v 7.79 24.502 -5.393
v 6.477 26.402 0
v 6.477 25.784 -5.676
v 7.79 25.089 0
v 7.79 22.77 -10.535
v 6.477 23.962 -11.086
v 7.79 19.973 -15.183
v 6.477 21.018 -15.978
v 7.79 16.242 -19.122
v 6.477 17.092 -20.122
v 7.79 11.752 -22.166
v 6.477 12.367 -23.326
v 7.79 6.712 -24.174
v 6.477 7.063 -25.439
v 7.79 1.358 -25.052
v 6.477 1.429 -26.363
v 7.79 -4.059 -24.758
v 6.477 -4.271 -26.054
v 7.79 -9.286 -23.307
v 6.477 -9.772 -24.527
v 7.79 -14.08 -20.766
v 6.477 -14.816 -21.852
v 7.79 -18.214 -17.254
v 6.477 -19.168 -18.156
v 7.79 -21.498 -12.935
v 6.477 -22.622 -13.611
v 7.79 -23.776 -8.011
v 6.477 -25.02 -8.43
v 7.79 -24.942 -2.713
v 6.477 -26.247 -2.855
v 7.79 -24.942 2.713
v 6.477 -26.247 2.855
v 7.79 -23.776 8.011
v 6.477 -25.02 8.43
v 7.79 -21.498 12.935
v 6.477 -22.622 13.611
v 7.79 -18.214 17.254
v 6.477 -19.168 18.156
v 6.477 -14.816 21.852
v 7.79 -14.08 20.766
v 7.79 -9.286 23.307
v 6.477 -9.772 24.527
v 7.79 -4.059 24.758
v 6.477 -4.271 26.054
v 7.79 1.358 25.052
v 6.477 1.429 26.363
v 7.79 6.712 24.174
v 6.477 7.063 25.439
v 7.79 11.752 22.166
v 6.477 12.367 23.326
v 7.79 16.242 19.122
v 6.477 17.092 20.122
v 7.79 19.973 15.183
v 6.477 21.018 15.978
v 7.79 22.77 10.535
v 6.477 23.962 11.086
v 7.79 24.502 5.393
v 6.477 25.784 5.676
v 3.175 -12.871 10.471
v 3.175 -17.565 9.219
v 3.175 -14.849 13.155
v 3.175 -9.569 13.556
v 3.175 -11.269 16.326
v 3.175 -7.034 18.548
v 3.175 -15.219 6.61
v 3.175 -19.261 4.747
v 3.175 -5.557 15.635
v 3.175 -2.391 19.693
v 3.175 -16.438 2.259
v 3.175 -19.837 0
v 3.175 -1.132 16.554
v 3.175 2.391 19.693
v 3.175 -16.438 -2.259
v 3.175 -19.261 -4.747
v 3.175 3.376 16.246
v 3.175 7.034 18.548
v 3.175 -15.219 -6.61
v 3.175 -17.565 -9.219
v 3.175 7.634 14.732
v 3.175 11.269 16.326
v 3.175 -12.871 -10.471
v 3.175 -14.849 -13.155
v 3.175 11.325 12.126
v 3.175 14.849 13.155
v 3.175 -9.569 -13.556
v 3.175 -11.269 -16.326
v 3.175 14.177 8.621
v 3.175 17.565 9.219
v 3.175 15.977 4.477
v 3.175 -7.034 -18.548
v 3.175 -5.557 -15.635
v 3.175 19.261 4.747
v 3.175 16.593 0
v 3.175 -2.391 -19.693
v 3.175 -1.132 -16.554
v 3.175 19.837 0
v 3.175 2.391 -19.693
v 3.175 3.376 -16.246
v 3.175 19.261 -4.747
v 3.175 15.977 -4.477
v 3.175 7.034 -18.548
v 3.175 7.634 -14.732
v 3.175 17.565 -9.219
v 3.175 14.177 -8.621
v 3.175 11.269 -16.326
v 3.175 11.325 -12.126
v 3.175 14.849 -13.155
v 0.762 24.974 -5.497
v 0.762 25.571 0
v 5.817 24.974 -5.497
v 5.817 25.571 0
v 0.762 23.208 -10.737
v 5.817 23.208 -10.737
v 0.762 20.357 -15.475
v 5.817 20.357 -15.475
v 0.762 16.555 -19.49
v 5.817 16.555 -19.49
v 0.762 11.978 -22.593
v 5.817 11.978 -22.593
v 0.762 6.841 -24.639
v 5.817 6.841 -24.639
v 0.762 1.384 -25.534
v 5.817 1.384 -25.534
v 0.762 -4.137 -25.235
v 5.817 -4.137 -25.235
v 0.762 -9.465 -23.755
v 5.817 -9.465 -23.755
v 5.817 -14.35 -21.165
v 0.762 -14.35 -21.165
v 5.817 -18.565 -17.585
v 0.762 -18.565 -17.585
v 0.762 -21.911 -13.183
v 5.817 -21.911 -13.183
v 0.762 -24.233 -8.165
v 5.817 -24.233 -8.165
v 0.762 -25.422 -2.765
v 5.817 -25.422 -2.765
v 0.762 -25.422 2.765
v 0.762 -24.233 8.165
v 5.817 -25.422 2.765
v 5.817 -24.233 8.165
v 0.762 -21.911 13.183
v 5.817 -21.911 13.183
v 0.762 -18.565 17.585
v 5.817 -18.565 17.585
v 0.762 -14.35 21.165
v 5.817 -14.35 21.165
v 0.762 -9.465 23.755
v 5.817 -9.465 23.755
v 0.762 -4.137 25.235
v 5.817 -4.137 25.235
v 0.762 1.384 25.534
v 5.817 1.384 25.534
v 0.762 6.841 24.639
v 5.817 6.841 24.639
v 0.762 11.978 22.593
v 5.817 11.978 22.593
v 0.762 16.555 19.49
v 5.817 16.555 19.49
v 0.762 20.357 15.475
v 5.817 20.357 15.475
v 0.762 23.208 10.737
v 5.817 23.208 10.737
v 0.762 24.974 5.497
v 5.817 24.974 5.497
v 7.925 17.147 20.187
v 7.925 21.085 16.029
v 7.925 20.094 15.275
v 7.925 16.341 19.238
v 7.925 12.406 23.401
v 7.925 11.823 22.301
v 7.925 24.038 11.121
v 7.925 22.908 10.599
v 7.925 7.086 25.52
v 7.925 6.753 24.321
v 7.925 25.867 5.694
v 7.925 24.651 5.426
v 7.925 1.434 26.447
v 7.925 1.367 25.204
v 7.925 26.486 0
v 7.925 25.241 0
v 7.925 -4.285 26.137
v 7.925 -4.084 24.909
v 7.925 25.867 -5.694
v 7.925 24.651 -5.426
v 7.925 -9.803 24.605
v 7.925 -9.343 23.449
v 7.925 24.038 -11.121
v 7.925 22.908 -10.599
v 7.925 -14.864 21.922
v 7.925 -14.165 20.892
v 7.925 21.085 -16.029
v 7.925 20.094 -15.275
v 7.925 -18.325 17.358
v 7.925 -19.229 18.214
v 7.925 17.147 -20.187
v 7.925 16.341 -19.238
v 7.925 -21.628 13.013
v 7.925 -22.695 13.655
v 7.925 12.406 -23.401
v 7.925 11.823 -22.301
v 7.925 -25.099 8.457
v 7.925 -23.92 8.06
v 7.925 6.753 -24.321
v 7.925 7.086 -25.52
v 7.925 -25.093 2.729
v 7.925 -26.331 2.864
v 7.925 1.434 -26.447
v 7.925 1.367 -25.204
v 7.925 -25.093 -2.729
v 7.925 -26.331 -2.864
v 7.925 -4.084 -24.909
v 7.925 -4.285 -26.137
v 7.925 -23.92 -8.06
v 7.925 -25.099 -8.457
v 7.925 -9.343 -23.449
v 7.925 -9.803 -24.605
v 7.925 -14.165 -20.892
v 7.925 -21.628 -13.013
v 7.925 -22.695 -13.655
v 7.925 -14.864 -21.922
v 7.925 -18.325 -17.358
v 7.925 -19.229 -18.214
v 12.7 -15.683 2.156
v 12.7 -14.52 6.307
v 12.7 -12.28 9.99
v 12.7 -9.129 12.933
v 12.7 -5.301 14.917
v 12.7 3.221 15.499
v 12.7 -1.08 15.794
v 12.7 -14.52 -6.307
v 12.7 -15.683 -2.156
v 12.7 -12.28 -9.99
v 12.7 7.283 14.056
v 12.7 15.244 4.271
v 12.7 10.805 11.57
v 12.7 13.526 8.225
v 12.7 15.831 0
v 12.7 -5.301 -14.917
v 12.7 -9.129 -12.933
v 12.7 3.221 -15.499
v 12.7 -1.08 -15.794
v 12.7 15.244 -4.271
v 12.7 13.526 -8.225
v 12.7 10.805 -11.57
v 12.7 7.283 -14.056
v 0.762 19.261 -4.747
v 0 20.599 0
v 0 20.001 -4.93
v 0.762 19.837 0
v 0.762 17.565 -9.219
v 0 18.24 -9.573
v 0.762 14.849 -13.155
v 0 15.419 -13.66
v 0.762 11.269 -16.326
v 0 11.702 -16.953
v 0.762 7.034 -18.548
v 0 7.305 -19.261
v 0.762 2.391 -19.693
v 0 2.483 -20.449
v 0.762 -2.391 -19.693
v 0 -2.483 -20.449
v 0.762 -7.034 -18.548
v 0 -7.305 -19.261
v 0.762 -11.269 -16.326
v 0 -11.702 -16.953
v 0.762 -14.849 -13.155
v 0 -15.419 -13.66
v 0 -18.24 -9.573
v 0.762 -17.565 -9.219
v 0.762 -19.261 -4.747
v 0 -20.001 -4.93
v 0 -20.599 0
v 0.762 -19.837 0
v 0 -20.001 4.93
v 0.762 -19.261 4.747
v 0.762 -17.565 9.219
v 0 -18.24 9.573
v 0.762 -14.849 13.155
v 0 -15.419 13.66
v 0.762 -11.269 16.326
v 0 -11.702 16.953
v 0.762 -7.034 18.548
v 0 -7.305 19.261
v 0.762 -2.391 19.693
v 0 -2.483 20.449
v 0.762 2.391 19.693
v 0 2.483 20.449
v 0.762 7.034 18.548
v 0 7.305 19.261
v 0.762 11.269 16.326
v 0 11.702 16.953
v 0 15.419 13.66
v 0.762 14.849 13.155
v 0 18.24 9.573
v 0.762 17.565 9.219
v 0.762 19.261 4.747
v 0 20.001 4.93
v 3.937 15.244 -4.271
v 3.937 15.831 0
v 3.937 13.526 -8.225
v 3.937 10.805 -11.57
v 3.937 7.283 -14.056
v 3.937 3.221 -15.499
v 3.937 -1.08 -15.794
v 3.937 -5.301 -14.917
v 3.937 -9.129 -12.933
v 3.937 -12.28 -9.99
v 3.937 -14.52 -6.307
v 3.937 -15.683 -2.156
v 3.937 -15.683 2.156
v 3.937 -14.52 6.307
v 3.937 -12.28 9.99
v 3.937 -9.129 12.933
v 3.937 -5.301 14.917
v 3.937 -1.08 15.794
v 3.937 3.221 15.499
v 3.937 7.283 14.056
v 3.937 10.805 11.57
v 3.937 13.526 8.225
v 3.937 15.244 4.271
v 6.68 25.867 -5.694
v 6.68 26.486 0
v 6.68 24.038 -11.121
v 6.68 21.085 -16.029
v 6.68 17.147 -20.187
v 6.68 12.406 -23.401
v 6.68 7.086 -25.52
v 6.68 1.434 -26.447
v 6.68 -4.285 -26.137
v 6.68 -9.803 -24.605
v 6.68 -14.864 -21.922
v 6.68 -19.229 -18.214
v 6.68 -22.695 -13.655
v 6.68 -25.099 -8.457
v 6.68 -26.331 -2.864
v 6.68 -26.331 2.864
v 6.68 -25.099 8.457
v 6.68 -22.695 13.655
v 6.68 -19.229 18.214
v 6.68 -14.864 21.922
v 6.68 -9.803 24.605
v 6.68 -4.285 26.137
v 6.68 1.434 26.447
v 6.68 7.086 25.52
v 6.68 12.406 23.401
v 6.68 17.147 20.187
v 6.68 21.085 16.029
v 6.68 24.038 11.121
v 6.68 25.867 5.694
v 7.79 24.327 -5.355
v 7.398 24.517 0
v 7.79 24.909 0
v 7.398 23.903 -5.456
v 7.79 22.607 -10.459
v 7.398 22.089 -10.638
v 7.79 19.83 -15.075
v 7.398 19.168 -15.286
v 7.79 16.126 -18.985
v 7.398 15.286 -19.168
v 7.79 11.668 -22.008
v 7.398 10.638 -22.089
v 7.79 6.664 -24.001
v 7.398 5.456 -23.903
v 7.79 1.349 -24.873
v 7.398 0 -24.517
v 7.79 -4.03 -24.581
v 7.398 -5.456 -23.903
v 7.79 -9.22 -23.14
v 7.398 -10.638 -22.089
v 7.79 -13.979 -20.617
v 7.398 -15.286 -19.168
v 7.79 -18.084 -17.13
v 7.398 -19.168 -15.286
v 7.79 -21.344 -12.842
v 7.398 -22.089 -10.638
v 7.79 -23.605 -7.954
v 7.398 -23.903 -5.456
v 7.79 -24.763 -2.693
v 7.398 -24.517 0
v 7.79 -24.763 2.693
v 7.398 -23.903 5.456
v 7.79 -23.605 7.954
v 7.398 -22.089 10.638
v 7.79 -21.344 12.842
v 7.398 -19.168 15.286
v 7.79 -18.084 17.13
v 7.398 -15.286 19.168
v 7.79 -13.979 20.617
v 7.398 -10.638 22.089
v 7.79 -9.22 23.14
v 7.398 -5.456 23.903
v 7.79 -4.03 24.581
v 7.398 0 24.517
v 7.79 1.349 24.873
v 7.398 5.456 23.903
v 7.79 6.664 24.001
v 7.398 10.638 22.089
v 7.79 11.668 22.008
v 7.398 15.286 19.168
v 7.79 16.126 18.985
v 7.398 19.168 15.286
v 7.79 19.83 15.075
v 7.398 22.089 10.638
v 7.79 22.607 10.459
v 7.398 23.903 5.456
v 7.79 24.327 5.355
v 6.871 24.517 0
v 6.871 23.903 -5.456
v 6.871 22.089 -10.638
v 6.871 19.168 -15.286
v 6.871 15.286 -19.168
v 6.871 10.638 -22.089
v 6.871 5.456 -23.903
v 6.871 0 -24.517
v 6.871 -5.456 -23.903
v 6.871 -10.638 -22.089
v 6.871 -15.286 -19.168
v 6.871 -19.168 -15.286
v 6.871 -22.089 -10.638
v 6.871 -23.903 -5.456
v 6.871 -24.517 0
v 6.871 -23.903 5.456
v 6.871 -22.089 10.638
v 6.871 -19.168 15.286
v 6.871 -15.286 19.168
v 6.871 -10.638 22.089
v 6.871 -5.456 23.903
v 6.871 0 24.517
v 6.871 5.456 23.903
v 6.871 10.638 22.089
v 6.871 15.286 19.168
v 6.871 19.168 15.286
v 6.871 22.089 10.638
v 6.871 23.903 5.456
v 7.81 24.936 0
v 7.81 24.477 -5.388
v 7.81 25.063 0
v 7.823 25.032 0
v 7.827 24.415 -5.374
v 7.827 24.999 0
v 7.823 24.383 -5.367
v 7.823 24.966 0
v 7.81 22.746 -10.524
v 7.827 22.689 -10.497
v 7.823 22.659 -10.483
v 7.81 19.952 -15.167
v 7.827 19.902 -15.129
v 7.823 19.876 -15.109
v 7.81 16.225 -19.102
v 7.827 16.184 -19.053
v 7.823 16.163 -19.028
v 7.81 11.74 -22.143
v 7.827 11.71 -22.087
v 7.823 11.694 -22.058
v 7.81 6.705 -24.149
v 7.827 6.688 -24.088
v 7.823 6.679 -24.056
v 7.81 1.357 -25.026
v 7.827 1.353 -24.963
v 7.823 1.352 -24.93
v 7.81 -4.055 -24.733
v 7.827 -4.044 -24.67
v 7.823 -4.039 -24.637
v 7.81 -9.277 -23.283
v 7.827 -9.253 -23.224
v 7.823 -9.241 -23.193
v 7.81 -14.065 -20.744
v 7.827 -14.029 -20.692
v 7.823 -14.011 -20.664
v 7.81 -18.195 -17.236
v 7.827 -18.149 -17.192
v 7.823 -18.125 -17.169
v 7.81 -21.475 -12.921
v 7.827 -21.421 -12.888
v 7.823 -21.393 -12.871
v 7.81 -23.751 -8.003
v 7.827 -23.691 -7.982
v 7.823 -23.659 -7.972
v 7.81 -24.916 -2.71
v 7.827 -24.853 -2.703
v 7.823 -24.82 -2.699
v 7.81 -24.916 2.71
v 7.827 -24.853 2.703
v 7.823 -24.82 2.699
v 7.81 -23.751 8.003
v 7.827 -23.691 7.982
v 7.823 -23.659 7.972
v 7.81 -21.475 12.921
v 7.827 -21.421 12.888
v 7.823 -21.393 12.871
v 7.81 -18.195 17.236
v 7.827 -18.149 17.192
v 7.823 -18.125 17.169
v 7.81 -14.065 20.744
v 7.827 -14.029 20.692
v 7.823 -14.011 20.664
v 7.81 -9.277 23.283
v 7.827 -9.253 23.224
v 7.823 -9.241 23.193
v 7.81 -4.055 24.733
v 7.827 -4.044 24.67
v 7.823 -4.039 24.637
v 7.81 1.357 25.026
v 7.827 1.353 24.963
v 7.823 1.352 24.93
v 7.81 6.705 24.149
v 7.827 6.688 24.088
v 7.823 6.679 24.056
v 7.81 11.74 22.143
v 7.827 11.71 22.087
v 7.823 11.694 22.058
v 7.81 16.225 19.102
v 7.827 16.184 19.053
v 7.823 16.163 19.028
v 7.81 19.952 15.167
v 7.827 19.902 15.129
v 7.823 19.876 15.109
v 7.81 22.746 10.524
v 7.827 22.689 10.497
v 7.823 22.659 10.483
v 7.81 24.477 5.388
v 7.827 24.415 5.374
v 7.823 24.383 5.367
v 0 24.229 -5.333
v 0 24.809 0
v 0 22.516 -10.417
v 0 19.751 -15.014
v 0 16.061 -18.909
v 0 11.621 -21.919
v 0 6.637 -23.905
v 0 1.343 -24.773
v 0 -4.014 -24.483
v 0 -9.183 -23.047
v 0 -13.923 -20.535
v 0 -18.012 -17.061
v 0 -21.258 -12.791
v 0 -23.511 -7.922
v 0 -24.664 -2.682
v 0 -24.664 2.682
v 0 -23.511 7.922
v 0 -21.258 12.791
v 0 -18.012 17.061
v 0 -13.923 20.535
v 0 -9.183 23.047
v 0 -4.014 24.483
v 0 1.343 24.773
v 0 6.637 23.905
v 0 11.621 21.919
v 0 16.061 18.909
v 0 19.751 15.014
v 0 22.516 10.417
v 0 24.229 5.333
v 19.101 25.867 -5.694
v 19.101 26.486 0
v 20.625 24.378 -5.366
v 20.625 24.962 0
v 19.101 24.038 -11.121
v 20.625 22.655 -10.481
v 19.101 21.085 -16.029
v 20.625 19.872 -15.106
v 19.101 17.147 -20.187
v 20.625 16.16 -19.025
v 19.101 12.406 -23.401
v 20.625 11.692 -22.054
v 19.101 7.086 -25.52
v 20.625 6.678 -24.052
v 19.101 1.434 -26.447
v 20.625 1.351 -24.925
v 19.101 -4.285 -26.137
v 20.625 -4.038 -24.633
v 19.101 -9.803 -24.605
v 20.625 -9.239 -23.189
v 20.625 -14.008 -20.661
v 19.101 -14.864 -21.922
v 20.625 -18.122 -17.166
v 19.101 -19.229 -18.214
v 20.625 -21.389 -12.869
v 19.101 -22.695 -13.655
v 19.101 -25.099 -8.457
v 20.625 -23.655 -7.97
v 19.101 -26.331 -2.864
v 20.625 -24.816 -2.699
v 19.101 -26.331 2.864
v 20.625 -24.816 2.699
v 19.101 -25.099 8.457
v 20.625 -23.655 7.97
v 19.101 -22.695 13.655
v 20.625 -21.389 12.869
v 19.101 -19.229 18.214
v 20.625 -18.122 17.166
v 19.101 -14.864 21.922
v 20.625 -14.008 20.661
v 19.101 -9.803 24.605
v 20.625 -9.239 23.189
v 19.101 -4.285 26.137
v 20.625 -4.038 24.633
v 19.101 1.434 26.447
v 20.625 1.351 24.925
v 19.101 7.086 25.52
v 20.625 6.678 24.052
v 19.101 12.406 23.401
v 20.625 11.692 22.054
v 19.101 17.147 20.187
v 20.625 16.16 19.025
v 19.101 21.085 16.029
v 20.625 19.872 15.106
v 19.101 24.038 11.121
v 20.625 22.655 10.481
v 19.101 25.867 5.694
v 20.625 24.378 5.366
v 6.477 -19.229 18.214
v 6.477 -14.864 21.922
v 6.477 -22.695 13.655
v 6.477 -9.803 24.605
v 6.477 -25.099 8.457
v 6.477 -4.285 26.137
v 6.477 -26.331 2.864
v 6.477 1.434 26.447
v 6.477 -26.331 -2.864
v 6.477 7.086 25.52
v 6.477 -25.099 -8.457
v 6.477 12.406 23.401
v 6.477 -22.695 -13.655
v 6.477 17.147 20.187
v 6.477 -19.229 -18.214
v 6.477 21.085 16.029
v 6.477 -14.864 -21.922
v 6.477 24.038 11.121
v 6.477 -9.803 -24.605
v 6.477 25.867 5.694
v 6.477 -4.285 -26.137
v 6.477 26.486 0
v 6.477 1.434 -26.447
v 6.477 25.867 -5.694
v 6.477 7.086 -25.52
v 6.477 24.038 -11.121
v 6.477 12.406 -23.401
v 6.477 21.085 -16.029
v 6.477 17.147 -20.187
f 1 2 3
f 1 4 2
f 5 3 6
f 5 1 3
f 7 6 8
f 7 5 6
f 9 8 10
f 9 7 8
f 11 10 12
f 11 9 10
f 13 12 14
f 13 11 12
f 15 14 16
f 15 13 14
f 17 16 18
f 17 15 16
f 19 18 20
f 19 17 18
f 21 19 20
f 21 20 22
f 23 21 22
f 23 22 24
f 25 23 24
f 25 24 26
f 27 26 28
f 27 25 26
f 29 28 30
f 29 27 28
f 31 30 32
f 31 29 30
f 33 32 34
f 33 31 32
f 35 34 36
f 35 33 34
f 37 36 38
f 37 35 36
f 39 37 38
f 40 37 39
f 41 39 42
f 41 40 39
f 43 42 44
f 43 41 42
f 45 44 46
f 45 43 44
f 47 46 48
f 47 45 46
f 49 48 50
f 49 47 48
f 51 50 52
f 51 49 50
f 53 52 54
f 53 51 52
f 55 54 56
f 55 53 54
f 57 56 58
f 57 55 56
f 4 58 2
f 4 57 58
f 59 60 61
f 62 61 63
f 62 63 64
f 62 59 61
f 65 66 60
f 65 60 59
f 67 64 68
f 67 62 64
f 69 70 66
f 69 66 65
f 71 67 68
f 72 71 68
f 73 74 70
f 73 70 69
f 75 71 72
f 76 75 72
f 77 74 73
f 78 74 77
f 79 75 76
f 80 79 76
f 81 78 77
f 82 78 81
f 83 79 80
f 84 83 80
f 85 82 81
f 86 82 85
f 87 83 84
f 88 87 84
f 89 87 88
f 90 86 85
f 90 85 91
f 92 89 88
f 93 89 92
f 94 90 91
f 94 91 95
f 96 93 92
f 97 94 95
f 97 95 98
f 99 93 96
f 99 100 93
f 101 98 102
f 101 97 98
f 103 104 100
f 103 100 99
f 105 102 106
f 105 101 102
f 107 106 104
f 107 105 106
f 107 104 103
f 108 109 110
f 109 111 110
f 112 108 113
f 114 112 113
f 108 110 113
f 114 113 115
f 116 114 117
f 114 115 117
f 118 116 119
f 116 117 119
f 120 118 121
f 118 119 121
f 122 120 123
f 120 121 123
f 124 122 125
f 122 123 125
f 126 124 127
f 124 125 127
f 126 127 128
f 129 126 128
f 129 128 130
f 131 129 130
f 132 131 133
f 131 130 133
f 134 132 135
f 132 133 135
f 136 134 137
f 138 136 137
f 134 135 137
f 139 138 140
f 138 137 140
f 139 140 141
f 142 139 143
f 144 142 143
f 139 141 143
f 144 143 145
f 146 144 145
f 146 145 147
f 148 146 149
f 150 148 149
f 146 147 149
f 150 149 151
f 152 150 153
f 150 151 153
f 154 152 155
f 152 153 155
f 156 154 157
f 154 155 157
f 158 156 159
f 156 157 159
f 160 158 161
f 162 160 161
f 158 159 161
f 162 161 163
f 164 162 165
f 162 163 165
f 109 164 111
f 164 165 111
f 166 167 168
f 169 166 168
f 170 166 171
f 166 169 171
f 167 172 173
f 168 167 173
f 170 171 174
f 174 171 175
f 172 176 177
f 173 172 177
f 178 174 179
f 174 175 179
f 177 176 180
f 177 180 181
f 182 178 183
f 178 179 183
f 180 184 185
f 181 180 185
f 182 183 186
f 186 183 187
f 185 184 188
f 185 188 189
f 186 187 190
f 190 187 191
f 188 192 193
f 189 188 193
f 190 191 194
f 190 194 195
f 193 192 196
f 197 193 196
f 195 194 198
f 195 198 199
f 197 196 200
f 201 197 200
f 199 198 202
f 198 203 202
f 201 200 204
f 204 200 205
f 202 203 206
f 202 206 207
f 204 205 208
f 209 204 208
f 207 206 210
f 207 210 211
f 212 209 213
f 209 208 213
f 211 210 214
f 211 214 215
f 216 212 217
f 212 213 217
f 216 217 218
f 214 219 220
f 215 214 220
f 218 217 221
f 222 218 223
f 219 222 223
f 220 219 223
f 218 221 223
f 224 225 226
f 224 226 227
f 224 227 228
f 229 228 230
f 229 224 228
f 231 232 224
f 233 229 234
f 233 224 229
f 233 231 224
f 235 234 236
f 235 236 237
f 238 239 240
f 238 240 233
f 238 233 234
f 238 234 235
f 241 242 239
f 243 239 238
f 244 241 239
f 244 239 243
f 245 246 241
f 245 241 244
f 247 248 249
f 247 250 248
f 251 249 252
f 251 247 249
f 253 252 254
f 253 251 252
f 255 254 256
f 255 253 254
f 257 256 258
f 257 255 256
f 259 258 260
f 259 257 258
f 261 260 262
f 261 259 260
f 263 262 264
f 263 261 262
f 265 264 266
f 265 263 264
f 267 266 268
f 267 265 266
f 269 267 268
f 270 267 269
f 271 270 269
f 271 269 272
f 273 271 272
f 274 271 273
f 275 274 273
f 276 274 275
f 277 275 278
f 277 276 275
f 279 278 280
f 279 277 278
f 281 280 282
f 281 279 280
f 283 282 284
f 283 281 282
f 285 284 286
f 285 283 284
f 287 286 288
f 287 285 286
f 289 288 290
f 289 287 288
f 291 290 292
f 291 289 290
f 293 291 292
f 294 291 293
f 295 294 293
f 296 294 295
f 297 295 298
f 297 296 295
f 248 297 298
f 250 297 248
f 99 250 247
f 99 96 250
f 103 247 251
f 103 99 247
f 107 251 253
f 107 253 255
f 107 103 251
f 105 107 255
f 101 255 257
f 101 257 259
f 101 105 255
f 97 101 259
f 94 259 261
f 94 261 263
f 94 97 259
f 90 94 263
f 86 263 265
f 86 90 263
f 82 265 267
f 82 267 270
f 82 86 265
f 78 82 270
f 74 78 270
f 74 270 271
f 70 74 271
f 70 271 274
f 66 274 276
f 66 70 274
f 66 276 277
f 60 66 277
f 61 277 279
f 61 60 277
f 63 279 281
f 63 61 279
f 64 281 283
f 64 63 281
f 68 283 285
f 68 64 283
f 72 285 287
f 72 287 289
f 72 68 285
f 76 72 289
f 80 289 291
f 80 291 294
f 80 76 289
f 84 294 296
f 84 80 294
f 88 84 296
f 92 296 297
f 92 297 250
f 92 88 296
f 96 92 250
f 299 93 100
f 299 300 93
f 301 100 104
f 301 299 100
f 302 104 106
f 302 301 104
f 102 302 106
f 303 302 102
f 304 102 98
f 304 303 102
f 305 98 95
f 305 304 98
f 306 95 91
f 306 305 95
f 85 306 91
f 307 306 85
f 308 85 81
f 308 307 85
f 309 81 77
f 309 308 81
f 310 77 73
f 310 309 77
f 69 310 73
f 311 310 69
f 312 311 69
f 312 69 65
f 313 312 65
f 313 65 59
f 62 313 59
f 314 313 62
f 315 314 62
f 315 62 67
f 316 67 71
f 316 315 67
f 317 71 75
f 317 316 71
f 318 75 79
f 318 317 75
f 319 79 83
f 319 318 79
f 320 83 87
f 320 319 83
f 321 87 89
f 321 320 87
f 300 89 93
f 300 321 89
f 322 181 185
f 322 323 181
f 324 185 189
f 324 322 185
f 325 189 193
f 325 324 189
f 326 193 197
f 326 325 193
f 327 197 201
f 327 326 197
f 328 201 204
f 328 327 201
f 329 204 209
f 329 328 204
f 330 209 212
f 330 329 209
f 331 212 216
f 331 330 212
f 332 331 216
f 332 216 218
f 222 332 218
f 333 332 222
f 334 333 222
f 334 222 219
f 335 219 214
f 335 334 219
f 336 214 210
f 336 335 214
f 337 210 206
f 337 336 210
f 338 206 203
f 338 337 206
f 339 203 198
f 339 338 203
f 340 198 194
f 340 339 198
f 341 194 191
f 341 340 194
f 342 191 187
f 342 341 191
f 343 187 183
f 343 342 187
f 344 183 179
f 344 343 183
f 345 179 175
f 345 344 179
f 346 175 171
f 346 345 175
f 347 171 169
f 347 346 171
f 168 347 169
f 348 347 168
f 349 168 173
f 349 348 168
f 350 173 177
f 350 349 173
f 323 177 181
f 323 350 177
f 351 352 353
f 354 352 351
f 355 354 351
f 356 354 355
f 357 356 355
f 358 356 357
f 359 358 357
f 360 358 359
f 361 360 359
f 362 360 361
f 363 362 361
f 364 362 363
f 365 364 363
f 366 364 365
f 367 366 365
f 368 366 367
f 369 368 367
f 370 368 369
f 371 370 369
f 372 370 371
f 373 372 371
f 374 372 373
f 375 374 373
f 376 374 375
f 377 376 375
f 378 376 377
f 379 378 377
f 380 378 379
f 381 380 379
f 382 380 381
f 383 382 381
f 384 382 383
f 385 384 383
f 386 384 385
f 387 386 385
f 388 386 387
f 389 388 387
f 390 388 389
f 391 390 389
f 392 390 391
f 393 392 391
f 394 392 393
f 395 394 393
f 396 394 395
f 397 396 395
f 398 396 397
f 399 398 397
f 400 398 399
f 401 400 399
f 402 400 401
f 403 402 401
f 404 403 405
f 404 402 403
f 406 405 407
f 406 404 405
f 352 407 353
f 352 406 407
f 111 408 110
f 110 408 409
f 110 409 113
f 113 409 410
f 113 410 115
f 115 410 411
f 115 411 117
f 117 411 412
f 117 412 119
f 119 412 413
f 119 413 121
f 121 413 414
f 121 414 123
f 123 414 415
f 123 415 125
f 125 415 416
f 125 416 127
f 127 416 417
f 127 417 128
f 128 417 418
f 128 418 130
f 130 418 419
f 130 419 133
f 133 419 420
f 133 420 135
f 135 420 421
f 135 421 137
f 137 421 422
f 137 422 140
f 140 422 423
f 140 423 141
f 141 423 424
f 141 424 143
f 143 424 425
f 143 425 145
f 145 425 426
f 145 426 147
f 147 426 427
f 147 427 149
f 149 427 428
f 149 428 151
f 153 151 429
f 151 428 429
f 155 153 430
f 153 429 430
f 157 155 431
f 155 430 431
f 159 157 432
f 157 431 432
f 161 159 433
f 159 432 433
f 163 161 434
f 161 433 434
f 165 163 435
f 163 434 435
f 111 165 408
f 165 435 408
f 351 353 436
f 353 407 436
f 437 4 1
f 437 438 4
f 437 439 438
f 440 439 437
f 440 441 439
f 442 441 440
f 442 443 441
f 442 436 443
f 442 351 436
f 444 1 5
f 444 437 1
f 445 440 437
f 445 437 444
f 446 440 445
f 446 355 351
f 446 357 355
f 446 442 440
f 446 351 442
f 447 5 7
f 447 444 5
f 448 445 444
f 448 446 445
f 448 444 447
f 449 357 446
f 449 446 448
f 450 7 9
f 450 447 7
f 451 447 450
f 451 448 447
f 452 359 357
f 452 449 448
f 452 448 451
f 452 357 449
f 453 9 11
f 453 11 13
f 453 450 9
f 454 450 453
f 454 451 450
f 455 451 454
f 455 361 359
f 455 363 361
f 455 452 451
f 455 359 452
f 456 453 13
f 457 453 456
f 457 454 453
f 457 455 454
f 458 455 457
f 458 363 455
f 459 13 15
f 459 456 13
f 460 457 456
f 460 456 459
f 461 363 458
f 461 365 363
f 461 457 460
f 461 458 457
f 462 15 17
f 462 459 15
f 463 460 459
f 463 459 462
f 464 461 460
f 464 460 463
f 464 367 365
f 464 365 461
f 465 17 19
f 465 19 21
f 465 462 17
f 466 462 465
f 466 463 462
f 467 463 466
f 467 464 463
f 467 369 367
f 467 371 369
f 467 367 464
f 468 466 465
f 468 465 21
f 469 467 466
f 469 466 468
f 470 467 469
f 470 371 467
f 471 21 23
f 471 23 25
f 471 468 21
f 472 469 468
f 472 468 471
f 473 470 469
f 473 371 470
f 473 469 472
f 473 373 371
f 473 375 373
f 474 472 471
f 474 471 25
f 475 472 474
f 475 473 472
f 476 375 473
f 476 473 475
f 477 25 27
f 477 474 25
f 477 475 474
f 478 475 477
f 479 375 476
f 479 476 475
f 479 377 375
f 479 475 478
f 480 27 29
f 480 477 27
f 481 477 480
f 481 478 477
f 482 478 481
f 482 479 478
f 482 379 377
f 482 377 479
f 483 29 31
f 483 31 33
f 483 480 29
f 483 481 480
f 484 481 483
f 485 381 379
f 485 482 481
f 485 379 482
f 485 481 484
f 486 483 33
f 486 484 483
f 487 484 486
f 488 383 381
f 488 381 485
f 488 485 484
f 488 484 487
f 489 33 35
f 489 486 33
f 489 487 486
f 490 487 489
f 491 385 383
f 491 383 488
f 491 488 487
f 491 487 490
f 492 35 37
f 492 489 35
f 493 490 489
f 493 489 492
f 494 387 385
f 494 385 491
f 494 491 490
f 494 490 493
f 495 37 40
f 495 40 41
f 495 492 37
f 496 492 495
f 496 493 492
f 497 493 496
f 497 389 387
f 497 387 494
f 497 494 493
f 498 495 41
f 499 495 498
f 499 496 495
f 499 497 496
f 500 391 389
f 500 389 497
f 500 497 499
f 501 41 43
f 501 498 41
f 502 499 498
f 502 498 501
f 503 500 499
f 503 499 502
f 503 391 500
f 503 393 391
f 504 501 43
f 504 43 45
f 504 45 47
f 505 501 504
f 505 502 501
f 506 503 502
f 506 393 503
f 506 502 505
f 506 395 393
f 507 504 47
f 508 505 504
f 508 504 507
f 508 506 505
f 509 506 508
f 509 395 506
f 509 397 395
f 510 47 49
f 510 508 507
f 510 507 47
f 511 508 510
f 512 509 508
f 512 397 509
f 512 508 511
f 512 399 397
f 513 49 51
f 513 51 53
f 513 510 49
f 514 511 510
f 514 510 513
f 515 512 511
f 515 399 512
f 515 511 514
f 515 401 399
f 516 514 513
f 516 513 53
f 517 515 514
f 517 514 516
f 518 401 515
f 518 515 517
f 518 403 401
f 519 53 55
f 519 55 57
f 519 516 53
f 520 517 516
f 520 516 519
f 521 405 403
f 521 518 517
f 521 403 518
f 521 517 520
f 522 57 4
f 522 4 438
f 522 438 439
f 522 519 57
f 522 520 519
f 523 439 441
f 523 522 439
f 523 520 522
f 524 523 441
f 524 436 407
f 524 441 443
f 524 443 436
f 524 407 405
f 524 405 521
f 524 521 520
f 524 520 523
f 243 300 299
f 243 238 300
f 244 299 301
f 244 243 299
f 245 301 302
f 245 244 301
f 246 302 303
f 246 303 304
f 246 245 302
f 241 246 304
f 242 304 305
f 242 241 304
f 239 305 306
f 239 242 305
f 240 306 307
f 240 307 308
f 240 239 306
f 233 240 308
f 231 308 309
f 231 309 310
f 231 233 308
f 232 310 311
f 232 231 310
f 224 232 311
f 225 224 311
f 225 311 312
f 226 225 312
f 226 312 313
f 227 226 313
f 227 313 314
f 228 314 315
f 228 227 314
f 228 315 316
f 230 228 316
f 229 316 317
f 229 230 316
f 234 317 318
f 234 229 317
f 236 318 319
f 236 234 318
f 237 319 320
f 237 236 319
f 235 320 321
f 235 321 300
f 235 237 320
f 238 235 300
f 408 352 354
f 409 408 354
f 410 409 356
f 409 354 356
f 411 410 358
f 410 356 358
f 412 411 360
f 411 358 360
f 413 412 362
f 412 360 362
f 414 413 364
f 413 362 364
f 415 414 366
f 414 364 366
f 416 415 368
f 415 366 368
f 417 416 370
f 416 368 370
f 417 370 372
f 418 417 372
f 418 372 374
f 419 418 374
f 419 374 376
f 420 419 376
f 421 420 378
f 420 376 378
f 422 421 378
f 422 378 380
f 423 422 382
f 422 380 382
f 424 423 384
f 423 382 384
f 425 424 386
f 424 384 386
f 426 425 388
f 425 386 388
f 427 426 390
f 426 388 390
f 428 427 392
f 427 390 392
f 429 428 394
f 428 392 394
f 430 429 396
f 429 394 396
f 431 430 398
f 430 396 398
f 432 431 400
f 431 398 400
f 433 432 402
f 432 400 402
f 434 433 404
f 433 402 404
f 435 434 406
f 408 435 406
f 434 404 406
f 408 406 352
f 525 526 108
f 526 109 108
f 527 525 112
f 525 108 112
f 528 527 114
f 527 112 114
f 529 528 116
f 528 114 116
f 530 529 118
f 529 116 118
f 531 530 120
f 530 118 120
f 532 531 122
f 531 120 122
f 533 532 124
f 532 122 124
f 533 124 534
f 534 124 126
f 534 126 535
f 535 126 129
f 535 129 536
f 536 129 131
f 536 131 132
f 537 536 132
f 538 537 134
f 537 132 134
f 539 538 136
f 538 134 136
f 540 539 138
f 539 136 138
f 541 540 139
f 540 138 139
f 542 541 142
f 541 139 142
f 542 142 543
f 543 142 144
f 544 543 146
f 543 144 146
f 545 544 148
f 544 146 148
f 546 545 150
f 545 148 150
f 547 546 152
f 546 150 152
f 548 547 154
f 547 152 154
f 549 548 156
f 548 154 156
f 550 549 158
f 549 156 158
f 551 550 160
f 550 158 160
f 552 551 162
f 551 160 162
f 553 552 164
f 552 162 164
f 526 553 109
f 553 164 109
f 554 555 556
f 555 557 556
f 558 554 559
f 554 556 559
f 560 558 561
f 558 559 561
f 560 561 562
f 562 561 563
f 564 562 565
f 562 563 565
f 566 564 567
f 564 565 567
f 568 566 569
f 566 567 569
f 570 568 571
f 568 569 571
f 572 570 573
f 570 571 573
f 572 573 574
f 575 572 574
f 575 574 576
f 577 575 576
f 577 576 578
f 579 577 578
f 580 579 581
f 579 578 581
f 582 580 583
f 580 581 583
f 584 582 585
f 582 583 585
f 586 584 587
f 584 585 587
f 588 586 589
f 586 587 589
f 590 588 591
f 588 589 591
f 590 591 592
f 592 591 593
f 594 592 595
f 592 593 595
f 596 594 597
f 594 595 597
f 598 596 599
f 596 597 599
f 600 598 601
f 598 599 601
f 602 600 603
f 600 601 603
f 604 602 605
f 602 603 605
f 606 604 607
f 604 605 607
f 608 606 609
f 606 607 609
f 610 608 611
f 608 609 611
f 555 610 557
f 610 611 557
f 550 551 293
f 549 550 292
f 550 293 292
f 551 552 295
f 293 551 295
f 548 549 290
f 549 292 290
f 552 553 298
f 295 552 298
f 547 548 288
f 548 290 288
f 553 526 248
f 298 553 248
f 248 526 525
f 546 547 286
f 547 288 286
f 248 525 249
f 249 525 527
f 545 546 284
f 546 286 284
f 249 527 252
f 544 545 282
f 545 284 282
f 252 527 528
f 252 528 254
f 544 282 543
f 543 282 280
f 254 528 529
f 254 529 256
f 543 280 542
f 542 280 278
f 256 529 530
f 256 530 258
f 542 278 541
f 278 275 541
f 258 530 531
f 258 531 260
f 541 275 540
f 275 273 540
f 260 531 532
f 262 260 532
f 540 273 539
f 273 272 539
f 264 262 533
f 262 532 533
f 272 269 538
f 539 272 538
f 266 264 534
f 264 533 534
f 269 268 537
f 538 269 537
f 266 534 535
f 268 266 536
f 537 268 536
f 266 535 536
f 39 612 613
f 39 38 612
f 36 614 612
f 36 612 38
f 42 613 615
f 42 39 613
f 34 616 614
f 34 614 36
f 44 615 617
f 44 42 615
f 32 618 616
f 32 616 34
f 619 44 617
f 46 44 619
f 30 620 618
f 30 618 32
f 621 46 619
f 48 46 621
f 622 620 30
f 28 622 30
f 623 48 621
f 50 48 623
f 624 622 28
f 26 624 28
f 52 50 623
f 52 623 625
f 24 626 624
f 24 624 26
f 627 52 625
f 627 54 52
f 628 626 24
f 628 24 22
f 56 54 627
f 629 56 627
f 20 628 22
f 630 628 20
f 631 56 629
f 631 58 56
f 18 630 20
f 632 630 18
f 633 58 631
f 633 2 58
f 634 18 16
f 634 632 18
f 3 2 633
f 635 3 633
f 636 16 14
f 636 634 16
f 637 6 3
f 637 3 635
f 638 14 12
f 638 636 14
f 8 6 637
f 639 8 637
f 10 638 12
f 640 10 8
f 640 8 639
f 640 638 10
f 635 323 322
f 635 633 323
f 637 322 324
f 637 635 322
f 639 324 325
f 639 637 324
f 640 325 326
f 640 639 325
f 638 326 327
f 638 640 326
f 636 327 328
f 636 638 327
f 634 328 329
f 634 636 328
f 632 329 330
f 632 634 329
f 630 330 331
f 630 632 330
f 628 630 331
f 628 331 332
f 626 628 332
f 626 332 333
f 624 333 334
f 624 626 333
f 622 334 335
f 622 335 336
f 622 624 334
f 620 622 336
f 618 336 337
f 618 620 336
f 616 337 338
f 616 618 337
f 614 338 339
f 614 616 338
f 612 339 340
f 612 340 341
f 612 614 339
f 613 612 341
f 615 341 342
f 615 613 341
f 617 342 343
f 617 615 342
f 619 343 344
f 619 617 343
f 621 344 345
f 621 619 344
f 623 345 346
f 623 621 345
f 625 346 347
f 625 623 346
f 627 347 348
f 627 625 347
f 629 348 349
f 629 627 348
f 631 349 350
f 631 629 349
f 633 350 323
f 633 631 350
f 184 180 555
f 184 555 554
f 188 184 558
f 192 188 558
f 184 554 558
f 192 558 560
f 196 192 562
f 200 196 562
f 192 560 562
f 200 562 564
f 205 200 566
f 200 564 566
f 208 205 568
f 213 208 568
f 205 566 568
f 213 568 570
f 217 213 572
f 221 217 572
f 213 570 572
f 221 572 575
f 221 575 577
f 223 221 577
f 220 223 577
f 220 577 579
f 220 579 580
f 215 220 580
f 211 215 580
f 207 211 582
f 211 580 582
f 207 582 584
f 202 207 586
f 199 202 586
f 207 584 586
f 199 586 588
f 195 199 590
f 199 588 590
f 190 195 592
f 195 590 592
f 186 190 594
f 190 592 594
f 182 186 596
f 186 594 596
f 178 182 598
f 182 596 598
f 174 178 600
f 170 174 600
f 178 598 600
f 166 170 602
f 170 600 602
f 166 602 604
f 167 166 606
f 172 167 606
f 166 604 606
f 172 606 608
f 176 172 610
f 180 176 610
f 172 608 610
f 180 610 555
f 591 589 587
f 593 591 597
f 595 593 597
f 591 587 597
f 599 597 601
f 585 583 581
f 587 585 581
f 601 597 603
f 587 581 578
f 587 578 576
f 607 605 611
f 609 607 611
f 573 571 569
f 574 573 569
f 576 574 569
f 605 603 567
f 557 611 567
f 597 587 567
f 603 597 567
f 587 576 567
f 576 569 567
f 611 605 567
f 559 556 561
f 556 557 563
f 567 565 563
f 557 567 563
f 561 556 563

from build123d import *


with BuildPart() as part:
    # Sketch1 → Revolve1 (revolve)
    with BuildSketch(Plane.XY):
        Polygon((0, 0), (0, 24.80945), (0.762, 25.57145), (5.8166, 25.57145), (6.8707, 24.51735), (7.9248, 24.51735), (7.9248, 26.48585), (19.1008, 26.48585), (20.6248, 24.96185), (20.6248, 0), align=None)
    revolve(axis=Axis((20.6248, 0, 0), (-1, 0, 0)))

    # Sketch2 → Revolve2 (revolve)
    with BuildSketch(Plane.XY):
        with BuildLine():
            Line((6.477090712, 26.401681804), (7.789783697, 25.088988819))
            ThreePointArc((7.789783697, 25.088988819), (7.826981136, 24.999186258), (7.789783697, 24.909383697))
            Line((7.789783697, 24.909383697), (7.39775, 24.51735))
            Line((7.39775, 24.51735), (6.8707, 24.51735))
            Line((6.8707, 24.51735), (6.8707, 24.26335))
            Line((6.8707, 24.26335), (7.9248, 24.26335))
            Line((7.9248, 24.26335), (7.9248, 25.241340712))
            Line((7.9248, 25.241340712), (6.680290712, 26.48585))
            Line((6.680290712, 26.48585), (6.477090712, 26.48585))
            Line((6.477090712, 26.48585), (6.477090712, 26.401681804))
        make_face()
    revolve(axis=Axis((7.9248, 0, 0), (-1, 0, 0)))

    # Sketch3 → Cut-Revolve1 (revolve, cut)
    with BuildSketch(Plane.XY):
        Polygon((0, 0), (0, 20.5994), (0.762, 19.8374), (3.175, 19.8374), (3.175, 16.59255), (3.937, 15.83055), (12.7, 15.83055), (12.7, 0), align=None)
    revolve(axis=Axis((12.7, 0, 0), (-1, 0, 0)), mode=Mode.SUBTRACT)


solid = part.part
